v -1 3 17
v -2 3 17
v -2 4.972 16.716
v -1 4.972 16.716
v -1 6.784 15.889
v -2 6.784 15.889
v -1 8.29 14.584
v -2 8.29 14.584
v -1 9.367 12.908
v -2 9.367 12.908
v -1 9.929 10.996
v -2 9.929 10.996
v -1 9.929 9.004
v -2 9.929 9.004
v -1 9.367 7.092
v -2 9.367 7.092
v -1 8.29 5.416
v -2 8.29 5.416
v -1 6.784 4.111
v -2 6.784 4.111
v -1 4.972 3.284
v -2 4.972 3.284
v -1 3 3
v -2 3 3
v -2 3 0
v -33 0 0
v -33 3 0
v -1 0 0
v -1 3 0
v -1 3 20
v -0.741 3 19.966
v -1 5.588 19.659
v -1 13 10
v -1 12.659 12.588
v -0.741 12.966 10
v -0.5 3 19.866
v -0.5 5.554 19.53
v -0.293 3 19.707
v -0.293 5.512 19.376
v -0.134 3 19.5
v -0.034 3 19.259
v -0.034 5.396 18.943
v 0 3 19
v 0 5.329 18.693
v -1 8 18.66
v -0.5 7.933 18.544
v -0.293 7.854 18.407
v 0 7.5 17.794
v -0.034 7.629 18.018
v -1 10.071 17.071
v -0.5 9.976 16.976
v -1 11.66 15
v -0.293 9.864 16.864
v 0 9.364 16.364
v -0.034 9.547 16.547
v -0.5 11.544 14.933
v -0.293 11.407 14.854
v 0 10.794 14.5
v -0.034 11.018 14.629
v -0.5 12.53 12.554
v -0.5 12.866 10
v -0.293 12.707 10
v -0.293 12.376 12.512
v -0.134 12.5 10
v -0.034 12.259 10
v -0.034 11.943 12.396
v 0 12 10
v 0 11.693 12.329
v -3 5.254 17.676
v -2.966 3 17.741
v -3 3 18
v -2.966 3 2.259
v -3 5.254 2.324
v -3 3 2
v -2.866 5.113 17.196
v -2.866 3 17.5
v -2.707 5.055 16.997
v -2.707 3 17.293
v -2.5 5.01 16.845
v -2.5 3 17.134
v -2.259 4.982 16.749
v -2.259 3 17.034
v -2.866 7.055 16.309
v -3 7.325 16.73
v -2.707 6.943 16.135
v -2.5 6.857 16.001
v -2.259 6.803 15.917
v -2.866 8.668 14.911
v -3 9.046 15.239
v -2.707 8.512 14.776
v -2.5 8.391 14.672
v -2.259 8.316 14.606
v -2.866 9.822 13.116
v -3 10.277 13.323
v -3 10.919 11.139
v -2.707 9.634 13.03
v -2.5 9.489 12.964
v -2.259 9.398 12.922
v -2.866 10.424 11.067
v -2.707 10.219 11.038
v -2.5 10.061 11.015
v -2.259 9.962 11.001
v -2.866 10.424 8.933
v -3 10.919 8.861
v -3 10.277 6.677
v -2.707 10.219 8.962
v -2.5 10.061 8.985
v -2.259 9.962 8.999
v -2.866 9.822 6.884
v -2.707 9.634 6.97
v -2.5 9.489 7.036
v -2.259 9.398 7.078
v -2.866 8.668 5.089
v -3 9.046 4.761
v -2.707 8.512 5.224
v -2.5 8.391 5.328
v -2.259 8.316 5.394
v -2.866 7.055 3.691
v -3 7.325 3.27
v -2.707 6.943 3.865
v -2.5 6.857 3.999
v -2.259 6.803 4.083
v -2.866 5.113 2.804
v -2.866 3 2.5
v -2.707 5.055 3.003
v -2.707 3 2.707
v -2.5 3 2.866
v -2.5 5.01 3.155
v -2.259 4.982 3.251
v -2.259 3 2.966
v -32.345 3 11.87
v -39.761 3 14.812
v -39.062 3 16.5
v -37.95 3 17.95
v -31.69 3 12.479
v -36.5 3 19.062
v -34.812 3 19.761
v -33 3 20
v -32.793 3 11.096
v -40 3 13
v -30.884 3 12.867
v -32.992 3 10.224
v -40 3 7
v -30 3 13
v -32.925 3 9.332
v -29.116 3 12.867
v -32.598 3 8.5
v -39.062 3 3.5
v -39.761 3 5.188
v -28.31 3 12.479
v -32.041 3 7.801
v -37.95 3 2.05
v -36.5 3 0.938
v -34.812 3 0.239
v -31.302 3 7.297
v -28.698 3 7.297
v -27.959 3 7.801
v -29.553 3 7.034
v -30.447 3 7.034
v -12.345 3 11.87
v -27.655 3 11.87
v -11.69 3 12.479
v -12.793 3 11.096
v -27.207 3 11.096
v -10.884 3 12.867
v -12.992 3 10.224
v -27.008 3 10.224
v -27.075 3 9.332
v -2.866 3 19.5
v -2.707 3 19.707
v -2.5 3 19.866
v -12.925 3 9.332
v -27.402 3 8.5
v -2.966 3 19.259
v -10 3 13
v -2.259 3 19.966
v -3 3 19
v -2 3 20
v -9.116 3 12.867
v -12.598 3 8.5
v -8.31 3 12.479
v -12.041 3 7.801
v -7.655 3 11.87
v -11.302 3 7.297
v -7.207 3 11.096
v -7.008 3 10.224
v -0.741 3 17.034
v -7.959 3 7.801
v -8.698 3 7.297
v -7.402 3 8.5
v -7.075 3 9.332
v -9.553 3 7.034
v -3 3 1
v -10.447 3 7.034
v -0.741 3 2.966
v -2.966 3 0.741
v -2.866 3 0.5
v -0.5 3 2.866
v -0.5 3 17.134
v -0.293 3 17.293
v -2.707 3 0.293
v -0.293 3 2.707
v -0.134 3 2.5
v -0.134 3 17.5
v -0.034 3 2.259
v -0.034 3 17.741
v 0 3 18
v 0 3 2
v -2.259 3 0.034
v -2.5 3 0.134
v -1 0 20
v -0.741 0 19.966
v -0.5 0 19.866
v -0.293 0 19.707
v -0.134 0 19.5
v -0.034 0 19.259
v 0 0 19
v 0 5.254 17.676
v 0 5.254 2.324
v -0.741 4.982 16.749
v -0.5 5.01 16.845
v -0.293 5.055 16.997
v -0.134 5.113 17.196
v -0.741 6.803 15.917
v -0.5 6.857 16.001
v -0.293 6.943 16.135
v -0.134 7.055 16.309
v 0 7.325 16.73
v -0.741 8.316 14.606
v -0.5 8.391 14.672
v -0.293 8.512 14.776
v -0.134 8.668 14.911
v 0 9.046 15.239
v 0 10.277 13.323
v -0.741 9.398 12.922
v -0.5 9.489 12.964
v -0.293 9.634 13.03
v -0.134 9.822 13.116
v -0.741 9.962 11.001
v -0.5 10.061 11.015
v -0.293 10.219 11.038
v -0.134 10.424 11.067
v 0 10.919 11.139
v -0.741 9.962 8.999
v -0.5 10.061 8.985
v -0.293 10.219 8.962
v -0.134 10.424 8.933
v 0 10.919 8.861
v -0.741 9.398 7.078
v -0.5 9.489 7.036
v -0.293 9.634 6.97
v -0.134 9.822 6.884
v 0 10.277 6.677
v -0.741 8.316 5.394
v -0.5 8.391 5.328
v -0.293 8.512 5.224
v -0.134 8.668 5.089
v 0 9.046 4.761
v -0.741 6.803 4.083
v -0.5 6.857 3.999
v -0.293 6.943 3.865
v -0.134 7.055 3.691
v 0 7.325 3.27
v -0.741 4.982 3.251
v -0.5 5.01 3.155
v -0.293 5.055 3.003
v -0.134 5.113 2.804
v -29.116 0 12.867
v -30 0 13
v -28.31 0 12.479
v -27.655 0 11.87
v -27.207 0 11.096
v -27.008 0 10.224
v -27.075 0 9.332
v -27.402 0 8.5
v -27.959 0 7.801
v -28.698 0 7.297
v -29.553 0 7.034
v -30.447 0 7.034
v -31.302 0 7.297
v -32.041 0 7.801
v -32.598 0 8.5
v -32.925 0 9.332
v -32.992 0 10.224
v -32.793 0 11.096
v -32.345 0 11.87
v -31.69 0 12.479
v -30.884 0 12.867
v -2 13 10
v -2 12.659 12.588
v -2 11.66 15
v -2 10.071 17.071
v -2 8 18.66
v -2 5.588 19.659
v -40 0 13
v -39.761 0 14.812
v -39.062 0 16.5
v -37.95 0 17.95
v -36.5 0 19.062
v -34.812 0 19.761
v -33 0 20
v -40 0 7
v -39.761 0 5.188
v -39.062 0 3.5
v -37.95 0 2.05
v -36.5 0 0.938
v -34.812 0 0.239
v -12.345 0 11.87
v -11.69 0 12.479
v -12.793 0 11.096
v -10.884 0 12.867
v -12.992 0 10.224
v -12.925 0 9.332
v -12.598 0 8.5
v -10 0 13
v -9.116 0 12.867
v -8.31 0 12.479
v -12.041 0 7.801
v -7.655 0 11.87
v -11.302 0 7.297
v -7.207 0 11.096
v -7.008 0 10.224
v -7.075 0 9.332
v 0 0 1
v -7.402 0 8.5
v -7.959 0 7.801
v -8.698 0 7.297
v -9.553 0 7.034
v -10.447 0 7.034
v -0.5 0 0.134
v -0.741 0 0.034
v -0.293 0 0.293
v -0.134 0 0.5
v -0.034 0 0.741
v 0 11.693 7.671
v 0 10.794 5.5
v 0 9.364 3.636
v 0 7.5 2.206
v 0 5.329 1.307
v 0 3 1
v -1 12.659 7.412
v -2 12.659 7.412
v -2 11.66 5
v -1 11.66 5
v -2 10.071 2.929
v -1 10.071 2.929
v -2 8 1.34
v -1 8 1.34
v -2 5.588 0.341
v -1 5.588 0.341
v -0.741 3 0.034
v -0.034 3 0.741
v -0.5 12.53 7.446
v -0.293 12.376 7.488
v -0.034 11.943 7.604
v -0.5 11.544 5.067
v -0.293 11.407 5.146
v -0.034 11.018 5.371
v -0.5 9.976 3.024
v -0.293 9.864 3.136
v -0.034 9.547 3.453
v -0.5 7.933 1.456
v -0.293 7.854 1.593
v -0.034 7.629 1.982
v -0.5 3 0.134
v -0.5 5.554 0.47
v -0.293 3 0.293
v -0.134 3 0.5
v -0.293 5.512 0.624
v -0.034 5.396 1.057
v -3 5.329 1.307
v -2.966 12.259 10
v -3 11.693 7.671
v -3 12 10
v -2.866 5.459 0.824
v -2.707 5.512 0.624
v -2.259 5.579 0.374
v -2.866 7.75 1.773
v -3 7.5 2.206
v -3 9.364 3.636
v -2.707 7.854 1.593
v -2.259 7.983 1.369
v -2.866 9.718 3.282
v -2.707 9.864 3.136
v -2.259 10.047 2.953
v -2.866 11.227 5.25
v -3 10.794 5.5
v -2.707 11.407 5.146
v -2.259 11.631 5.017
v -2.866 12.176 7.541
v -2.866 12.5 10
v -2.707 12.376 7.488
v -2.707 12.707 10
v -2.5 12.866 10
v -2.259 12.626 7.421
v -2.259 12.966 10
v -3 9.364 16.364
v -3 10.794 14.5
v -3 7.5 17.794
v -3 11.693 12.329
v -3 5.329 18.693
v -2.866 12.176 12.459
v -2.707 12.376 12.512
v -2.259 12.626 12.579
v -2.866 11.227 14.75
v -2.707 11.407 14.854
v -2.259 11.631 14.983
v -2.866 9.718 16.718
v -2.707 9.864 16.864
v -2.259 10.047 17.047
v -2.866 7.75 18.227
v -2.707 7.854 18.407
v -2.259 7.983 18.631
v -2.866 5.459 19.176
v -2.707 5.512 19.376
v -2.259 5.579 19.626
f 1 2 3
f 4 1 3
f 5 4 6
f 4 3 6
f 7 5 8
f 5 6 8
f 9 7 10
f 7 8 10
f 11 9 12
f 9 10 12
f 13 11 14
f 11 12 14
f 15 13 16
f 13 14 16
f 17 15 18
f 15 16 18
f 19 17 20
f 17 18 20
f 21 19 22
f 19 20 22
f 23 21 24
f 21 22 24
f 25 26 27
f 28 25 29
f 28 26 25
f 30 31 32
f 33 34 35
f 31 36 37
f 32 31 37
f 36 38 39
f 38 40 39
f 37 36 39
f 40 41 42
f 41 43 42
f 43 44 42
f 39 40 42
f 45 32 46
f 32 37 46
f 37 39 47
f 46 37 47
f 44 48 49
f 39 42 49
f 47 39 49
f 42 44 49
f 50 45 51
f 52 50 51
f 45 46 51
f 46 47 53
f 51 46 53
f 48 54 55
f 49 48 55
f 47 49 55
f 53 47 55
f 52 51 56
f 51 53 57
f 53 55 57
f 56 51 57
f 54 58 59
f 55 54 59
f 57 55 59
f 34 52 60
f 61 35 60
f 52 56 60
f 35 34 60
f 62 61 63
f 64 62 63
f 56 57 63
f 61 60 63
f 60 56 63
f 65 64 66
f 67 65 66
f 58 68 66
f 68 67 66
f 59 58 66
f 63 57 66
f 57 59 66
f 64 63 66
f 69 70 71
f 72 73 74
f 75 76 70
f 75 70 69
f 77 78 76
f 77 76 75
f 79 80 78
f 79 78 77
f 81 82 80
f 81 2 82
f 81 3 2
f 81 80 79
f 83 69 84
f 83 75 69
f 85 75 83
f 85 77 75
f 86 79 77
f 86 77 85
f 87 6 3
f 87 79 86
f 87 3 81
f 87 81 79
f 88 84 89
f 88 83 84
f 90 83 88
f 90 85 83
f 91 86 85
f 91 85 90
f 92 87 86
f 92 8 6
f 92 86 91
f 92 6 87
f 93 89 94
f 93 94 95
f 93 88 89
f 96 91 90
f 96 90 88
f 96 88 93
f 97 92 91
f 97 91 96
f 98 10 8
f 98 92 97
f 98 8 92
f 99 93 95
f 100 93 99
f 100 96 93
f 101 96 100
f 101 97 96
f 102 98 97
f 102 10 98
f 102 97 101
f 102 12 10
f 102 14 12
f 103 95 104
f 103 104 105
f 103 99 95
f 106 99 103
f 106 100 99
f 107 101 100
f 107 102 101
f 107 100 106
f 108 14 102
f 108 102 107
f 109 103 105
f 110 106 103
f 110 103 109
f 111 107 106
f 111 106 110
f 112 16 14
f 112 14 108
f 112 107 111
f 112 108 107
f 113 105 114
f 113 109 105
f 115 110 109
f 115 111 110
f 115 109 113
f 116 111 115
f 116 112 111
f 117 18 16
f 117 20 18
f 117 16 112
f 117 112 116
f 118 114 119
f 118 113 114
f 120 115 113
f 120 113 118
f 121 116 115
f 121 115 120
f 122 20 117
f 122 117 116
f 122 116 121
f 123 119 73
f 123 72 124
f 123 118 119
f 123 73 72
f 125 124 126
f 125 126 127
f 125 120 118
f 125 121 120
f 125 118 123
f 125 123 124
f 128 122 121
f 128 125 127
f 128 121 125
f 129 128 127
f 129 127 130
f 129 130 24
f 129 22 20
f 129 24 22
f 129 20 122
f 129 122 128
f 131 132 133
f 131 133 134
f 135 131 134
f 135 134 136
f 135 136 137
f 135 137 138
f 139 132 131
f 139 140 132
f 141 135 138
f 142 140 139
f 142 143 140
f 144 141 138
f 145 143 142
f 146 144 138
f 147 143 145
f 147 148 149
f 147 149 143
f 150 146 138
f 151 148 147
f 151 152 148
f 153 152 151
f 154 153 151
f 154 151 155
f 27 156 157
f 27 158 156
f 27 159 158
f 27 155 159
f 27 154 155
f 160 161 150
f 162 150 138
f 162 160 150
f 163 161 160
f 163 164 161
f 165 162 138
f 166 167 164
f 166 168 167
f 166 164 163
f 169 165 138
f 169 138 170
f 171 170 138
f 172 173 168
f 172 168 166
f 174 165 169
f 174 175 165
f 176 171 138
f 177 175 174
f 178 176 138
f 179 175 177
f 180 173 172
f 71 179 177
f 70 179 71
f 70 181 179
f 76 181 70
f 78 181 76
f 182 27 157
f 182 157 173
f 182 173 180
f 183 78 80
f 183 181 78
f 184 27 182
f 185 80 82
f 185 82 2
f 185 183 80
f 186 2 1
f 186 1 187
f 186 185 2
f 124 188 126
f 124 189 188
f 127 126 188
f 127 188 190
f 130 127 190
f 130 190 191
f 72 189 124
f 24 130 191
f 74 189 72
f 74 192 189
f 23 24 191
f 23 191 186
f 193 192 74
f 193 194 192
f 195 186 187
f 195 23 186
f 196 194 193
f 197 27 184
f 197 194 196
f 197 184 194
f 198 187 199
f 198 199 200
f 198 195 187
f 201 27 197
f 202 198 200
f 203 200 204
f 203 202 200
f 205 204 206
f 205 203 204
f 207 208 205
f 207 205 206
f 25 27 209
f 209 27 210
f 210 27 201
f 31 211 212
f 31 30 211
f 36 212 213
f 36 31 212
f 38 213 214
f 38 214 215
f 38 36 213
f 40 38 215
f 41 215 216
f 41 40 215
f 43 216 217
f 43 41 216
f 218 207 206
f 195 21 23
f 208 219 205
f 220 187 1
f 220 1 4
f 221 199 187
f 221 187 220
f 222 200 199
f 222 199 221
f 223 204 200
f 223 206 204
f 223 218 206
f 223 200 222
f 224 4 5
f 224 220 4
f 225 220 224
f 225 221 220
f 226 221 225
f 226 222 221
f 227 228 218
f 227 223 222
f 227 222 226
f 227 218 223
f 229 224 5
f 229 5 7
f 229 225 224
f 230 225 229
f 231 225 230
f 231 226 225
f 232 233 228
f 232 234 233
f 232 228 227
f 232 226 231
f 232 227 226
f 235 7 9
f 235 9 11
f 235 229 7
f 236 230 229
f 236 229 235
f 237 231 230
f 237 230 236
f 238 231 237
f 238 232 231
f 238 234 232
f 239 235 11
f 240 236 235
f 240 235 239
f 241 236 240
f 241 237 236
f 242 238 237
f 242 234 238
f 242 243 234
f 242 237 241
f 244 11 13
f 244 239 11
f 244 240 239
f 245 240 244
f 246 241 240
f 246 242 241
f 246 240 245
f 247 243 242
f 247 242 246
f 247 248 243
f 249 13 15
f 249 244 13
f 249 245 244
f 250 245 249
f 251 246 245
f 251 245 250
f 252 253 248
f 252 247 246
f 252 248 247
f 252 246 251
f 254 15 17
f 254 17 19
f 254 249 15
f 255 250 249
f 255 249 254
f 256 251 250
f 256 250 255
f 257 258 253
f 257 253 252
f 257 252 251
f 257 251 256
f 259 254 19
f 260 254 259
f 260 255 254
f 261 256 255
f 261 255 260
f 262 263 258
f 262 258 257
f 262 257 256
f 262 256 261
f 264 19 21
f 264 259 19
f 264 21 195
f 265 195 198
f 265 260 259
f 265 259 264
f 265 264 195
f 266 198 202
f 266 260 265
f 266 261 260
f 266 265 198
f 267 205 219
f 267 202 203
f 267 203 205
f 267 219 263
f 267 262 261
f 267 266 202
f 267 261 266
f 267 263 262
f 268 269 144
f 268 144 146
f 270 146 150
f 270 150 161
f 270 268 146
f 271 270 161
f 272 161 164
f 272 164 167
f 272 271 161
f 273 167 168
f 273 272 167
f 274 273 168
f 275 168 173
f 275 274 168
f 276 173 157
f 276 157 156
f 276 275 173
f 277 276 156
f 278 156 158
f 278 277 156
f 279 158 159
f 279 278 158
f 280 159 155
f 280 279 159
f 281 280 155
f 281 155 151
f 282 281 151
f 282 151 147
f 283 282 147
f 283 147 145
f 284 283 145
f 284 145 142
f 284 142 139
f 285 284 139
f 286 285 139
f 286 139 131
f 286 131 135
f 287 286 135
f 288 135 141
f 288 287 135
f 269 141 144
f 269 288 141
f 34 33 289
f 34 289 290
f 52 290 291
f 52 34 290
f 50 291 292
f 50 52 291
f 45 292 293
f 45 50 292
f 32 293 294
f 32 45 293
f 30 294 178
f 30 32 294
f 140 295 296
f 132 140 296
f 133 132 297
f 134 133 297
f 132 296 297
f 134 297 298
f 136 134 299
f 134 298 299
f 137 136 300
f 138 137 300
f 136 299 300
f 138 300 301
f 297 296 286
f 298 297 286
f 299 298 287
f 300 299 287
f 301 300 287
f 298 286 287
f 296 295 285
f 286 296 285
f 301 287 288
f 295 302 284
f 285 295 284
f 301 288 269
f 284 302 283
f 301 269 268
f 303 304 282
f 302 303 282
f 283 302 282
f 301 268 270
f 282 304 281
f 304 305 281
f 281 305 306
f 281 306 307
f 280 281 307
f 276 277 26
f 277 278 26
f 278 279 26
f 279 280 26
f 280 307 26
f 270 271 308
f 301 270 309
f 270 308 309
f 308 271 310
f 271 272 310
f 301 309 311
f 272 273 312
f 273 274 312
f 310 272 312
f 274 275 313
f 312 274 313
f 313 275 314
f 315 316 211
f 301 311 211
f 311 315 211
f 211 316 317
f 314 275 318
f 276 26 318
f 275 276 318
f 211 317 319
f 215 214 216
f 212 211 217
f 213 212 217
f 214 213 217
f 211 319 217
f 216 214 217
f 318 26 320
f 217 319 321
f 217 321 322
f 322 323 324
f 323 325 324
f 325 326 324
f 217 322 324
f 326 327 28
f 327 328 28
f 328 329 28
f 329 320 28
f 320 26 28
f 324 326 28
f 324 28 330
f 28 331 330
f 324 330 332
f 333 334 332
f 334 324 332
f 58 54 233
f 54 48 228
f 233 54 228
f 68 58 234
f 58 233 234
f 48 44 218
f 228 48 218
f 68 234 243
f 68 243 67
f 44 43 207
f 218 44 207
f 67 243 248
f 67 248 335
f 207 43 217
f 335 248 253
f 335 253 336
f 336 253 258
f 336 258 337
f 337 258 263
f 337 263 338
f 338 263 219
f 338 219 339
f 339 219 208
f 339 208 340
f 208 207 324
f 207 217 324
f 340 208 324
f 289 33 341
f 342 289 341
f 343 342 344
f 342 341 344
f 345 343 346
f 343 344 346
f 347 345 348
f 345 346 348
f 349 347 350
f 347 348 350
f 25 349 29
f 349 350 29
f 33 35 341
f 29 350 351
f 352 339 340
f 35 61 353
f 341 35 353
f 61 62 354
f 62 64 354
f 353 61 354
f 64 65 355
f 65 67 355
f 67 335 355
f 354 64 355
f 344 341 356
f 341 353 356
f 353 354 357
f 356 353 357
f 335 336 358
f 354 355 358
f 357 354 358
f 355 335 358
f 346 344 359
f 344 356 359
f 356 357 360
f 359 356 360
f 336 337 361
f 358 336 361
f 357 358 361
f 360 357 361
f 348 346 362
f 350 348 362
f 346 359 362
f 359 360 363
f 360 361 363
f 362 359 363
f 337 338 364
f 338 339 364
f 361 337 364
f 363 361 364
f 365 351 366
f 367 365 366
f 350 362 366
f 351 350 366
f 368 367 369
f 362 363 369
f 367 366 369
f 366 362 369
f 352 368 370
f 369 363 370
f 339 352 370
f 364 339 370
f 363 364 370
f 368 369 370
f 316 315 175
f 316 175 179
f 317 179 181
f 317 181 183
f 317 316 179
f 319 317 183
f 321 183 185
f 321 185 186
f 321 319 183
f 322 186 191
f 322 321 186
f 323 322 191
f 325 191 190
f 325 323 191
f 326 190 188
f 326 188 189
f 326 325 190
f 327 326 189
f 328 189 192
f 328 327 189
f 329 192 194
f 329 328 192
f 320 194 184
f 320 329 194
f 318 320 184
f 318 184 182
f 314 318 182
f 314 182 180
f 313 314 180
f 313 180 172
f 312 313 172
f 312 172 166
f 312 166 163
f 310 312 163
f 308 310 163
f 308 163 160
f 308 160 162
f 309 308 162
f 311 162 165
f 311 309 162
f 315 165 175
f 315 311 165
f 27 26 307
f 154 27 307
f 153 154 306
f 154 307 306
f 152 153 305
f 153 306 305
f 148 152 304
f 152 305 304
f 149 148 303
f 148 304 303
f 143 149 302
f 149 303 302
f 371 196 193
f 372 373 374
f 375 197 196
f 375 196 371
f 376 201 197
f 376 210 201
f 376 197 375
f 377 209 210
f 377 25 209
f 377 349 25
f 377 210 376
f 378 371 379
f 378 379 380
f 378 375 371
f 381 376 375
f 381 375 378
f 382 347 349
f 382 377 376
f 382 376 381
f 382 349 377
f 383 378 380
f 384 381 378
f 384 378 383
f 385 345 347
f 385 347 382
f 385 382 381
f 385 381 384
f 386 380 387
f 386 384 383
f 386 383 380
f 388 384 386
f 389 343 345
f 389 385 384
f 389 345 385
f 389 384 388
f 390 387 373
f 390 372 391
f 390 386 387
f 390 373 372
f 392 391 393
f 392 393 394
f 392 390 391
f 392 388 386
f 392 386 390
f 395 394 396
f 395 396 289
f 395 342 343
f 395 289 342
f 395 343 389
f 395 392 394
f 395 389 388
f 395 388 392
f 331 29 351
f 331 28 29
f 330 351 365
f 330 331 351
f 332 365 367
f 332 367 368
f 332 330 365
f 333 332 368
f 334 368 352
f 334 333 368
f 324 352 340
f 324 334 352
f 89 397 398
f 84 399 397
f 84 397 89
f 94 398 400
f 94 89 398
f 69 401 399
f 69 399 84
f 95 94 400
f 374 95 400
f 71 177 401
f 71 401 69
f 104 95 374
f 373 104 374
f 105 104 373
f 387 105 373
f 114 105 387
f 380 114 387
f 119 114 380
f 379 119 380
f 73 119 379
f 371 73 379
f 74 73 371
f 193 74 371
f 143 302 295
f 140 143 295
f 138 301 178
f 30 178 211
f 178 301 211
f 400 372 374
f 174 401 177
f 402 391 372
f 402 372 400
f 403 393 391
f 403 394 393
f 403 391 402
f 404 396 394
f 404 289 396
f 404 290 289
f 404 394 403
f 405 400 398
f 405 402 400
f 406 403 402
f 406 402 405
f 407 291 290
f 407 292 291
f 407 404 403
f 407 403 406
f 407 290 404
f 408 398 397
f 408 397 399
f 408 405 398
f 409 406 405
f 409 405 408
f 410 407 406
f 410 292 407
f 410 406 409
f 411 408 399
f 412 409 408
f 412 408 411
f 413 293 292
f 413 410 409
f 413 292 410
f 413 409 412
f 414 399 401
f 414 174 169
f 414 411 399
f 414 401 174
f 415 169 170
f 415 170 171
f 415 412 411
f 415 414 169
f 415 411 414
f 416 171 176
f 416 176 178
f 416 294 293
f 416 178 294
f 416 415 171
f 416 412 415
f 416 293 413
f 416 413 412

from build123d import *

# Parameters (mm, degrees)
SKETCH1_R           = 3
BOSS_EXTRUDE1_DEPTH = 3
SKETCH2_W           = 3
SKETCH2_H           = 20
BOSS_EXTRUDE2_DEPTH = 10
FILLET1_R           = 10
CUT_EXTRUDE1_DEPTH  = 45.022721406
FILLET2_R           = 1


with BuildPart() as part:
    # Sketch1 → Boss-Extrude1 (new body)
    with BuildSketch(Plane(origin=(0, 0, 0), x_dir=(1, 0, 0), z_dir=(0, 1, 0))):
        with BuildLine():
            Line((0, 0), (-33, 0))
            ThreePointArc((-33, 0), (-37.949747468, -2.050252532), (-40, -7))
            Line((-40, -7), (-40, -13))
            ThreePointArc((-40, -13), (-37.949747468, -17.949747468), (-33, -20))
            Line((-33, -20), (0, -20))
            Line((0, -20), (0, 0))
        make_face()
        with Locations(Location((-30, -10, 0), (0, 0, 270))):
            Circle(SKETCH1_R, mode=Mode.SUBTRACT)
        with Locations(Location((-10, -10, 0), (0, 0, 270))):
            Circle(SKETCH1_R, mode=Mode.SUBTRACT)
    extrude(amount=BOSS_EXTRUDE1_DEPTH)

    # Sketch2 → Boss-Extrude2 (add)
    with BuildSketch(Plane(origin=(0, 3, 0), x_dir=(1, 0, 0), z_dir=(0, 1, 0))):
        with Locations((-1.5, -10)):
            Rectangle(SKETCH2_W, SKETCH2_H)
    extrude(amount=BOSS_EXTRUDE2_DEPTH)

    # Fillet1
    fillet1_edges = [part.edges().sort_by_distance(p)[0] for p in [
        (-1.5, 13, 0),
        (-1.5, 13, 20),
    ]]
    fillet(fillet1_edges, radius=FILLET1_R - 0.0001)  # a hair under: the kernel refuses the full size

    # Sketch3 → Cut-Extrude1 (cut, through all)
    with BuildSketch(Plane.ZY.offset(3)):
        with BuildLine():
            Line((3, 3), (17, 3))
            ThreePointArc((17, 3), (10, 10), (3, 3))
        make_face()
    extrude(amount=-CUT_EXTRUDE1_DEPTH, mode=Mode.SUBTRACT)

    # Fillet2
    fillet2_edges = [part.edges().sort_by_distance(p)[0] for p in [
        (-3, 10.071097101, 17.071097101),
        (-3, 10.071097101, 2.928902899),
        (0, 1.50005, 0),
        (0, 1.50005, 20),
        (0, 10.071097101, 17.071097101),
        (0, 10.071097101, 2.928902899),
        (0, 10, 10),
        (-3, 10, 10),
    ]]
    fillet(fillet2_edges, radius=FILLET2_R)


solid = part.part
